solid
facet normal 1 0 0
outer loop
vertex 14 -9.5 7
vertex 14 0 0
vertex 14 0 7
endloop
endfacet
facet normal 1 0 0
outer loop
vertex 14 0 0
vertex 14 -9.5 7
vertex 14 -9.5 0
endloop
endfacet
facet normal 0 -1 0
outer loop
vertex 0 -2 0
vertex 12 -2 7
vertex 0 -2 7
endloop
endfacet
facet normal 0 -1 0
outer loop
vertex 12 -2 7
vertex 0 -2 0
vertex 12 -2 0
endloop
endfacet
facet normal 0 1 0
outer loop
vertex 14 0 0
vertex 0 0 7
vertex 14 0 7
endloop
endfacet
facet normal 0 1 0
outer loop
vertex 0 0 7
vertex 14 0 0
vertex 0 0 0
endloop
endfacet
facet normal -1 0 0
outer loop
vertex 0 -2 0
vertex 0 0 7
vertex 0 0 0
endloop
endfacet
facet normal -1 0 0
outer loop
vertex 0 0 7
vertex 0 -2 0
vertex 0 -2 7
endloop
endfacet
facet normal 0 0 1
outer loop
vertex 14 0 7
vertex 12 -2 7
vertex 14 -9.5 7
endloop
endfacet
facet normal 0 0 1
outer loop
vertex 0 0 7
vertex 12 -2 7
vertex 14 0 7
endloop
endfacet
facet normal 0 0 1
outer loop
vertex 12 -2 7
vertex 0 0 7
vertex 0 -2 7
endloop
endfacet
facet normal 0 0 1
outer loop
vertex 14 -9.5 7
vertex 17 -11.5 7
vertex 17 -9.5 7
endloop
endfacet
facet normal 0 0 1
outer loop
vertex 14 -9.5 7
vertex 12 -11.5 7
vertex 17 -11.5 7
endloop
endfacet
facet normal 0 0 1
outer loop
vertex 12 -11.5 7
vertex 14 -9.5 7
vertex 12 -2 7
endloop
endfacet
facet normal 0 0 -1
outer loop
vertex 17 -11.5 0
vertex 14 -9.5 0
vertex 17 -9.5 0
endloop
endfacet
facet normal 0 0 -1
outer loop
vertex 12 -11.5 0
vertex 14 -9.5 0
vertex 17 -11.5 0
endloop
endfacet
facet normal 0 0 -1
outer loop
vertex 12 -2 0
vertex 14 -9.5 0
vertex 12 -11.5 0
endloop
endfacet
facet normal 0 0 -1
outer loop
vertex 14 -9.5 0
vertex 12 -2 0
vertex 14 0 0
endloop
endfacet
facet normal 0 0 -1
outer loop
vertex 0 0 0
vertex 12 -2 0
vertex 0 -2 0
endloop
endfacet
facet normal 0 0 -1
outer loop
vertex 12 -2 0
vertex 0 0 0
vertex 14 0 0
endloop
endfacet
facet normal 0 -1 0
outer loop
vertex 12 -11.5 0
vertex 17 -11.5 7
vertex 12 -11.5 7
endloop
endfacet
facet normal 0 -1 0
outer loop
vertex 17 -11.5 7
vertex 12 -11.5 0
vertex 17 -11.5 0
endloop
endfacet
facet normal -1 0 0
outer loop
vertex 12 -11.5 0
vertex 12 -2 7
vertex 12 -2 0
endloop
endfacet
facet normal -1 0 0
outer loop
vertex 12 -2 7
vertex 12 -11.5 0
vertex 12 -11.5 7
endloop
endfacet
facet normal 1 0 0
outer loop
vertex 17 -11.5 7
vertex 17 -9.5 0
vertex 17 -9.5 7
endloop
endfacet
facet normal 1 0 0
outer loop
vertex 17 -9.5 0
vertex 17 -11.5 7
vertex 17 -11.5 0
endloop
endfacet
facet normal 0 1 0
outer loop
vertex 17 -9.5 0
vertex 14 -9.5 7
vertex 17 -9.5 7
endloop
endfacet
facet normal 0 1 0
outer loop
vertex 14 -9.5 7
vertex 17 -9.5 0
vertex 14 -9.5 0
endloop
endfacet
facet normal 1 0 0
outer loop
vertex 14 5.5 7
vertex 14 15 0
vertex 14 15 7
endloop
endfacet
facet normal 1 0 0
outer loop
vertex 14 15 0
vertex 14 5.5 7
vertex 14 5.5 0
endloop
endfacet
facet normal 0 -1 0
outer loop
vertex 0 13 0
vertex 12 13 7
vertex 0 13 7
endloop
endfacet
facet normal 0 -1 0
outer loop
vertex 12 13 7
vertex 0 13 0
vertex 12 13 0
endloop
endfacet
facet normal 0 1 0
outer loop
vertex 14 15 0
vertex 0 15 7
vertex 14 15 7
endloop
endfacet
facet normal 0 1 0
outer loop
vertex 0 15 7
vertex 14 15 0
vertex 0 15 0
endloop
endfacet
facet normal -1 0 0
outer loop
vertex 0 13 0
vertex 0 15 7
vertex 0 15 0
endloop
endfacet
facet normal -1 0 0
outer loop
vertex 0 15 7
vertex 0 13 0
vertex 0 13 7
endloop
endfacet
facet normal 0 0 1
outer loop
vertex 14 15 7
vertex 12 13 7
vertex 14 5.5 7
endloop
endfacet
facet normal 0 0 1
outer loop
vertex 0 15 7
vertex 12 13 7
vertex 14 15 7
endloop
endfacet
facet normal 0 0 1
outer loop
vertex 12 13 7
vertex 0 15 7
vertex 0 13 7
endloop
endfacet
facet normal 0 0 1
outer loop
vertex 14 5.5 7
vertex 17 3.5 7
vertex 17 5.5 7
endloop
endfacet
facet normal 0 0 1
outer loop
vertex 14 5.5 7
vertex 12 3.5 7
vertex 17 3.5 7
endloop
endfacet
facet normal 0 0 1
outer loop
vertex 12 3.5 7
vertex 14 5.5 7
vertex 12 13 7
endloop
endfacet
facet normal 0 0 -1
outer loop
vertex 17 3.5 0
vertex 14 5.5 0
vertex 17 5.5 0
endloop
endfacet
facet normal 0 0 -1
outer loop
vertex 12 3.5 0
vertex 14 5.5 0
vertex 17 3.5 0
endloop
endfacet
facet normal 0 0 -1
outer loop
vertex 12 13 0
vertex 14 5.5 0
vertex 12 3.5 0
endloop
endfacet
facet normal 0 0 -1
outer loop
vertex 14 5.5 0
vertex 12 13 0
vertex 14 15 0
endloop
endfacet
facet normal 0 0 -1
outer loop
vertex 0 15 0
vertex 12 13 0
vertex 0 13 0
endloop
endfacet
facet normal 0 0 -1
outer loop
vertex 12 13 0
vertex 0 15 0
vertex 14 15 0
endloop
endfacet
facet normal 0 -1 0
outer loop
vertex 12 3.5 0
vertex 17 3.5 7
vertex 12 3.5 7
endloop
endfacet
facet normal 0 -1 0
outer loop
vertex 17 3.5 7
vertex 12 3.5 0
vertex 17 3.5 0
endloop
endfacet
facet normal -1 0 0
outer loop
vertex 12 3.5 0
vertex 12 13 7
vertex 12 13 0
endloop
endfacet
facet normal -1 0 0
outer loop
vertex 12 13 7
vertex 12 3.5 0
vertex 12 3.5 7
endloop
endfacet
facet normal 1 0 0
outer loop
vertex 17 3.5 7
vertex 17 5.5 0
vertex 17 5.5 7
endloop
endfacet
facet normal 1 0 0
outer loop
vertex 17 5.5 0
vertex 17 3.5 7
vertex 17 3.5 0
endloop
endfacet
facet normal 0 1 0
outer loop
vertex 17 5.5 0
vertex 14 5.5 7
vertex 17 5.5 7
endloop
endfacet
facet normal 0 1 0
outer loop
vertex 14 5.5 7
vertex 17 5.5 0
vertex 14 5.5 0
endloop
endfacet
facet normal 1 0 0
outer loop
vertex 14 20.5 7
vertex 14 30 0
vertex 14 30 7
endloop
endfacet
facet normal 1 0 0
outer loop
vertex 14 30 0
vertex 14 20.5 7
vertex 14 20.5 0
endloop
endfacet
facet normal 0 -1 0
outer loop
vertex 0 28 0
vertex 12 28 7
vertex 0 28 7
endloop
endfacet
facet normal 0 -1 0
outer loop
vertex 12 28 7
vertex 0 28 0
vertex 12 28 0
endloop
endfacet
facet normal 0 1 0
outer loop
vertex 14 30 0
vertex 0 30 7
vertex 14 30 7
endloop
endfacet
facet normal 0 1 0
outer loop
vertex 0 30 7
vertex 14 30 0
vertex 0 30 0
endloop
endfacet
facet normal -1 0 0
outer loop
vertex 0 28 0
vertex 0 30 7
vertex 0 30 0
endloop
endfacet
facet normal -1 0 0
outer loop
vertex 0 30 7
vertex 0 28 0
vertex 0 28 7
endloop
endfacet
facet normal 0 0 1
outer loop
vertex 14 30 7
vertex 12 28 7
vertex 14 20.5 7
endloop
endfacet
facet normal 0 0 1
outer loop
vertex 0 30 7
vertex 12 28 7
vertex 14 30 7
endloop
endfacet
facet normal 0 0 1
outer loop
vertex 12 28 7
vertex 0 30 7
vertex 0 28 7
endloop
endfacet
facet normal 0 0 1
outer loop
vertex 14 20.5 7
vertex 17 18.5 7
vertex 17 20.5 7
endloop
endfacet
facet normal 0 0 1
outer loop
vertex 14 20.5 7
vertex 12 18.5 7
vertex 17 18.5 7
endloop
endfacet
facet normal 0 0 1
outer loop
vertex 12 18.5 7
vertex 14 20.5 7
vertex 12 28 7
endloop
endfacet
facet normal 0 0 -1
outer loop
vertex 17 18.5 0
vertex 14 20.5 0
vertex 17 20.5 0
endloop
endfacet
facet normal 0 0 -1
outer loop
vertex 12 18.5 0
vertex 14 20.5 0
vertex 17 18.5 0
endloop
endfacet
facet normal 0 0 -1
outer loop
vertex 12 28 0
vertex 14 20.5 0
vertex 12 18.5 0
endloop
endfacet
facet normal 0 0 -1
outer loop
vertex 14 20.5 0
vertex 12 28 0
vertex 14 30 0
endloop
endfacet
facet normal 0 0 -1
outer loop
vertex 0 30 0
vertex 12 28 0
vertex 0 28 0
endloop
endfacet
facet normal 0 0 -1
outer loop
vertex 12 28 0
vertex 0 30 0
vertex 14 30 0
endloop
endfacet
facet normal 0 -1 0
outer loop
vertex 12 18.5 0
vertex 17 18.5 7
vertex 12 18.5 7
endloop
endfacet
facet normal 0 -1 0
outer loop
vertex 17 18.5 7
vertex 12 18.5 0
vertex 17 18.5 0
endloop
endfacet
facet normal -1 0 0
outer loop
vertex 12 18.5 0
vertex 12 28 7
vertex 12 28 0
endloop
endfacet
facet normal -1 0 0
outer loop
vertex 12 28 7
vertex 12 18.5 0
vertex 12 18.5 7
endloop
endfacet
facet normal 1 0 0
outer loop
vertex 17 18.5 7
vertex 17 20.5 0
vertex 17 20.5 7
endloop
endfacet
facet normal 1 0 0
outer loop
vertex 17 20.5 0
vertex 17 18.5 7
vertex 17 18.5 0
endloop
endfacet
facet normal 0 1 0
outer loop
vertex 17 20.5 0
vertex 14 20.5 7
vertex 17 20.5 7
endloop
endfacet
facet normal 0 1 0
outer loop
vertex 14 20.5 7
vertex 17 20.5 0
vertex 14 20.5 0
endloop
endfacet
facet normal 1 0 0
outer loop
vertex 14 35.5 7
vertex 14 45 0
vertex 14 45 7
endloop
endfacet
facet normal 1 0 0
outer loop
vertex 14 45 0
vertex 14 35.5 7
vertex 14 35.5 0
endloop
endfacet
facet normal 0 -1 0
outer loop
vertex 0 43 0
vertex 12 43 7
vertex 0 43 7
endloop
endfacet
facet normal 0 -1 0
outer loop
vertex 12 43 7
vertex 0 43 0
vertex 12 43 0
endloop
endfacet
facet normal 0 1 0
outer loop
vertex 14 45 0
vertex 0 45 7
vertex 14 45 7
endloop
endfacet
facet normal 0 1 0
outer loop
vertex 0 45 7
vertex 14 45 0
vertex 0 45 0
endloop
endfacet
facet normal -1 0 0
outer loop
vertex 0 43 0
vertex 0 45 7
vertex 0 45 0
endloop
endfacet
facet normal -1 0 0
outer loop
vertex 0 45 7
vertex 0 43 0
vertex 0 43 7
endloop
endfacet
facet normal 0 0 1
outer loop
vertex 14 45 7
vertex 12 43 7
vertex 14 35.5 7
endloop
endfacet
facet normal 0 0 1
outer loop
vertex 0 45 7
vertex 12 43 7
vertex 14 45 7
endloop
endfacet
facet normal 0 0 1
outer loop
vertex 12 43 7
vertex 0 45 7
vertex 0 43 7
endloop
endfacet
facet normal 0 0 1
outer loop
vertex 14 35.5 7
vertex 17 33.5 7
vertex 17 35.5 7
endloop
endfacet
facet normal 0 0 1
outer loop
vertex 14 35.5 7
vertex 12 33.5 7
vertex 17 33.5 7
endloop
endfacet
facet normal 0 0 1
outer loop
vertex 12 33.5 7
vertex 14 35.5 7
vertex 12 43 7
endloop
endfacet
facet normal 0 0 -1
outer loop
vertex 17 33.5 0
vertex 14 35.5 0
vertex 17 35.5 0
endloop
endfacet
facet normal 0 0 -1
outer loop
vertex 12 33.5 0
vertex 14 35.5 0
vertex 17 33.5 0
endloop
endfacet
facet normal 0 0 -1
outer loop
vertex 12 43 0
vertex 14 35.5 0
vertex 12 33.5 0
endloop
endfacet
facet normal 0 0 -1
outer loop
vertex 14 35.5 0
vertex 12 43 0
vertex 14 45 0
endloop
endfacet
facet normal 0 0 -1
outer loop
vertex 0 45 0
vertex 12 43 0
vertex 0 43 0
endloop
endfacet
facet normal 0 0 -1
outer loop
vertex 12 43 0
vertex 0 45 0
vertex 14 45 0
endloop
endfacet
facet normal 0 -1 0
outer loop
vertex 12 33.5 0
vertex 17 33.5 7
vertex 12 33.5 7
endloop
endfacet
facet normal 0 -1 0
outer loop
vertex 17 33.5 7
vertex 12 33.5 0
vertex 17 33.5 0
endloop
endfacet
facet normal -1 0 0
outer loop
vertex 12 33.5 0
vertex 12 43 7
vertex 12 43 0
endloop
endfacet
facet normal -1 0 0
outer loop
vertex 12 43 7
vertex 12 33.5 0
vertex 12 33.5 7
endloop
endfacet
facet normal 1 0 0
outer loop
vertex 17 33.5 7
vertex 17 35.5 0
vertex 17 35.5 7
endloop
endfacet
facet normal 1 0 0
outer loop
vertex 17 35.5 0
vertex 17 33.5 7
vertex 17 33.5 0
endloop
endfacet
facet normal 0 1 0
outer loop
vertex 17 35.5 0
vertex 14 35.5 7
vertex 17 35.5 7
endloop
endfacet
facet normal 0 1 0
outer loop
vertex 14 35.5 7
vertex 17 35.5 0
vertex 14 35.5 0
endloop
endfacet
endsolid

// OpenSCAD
/*
  Equerre de fixation du breadboard
  Projets DIY - 02/20016 - http://www.projetsdiy.fr
  v1
*/

module equerre(){
    difference(){
        color("Orange") cube([14,7,2]);
    }
    translate([12,0,0]) color("Orange") cube([2,7,11.5]);
    translate([12,0,11.5 - 2]) color("Orange") cube([5,7,2]);
}

// 4 Equerres
for (a=[0:15:45]){
   translate([0,a,0]) rotate([90,0,0]) equerre();
}    
